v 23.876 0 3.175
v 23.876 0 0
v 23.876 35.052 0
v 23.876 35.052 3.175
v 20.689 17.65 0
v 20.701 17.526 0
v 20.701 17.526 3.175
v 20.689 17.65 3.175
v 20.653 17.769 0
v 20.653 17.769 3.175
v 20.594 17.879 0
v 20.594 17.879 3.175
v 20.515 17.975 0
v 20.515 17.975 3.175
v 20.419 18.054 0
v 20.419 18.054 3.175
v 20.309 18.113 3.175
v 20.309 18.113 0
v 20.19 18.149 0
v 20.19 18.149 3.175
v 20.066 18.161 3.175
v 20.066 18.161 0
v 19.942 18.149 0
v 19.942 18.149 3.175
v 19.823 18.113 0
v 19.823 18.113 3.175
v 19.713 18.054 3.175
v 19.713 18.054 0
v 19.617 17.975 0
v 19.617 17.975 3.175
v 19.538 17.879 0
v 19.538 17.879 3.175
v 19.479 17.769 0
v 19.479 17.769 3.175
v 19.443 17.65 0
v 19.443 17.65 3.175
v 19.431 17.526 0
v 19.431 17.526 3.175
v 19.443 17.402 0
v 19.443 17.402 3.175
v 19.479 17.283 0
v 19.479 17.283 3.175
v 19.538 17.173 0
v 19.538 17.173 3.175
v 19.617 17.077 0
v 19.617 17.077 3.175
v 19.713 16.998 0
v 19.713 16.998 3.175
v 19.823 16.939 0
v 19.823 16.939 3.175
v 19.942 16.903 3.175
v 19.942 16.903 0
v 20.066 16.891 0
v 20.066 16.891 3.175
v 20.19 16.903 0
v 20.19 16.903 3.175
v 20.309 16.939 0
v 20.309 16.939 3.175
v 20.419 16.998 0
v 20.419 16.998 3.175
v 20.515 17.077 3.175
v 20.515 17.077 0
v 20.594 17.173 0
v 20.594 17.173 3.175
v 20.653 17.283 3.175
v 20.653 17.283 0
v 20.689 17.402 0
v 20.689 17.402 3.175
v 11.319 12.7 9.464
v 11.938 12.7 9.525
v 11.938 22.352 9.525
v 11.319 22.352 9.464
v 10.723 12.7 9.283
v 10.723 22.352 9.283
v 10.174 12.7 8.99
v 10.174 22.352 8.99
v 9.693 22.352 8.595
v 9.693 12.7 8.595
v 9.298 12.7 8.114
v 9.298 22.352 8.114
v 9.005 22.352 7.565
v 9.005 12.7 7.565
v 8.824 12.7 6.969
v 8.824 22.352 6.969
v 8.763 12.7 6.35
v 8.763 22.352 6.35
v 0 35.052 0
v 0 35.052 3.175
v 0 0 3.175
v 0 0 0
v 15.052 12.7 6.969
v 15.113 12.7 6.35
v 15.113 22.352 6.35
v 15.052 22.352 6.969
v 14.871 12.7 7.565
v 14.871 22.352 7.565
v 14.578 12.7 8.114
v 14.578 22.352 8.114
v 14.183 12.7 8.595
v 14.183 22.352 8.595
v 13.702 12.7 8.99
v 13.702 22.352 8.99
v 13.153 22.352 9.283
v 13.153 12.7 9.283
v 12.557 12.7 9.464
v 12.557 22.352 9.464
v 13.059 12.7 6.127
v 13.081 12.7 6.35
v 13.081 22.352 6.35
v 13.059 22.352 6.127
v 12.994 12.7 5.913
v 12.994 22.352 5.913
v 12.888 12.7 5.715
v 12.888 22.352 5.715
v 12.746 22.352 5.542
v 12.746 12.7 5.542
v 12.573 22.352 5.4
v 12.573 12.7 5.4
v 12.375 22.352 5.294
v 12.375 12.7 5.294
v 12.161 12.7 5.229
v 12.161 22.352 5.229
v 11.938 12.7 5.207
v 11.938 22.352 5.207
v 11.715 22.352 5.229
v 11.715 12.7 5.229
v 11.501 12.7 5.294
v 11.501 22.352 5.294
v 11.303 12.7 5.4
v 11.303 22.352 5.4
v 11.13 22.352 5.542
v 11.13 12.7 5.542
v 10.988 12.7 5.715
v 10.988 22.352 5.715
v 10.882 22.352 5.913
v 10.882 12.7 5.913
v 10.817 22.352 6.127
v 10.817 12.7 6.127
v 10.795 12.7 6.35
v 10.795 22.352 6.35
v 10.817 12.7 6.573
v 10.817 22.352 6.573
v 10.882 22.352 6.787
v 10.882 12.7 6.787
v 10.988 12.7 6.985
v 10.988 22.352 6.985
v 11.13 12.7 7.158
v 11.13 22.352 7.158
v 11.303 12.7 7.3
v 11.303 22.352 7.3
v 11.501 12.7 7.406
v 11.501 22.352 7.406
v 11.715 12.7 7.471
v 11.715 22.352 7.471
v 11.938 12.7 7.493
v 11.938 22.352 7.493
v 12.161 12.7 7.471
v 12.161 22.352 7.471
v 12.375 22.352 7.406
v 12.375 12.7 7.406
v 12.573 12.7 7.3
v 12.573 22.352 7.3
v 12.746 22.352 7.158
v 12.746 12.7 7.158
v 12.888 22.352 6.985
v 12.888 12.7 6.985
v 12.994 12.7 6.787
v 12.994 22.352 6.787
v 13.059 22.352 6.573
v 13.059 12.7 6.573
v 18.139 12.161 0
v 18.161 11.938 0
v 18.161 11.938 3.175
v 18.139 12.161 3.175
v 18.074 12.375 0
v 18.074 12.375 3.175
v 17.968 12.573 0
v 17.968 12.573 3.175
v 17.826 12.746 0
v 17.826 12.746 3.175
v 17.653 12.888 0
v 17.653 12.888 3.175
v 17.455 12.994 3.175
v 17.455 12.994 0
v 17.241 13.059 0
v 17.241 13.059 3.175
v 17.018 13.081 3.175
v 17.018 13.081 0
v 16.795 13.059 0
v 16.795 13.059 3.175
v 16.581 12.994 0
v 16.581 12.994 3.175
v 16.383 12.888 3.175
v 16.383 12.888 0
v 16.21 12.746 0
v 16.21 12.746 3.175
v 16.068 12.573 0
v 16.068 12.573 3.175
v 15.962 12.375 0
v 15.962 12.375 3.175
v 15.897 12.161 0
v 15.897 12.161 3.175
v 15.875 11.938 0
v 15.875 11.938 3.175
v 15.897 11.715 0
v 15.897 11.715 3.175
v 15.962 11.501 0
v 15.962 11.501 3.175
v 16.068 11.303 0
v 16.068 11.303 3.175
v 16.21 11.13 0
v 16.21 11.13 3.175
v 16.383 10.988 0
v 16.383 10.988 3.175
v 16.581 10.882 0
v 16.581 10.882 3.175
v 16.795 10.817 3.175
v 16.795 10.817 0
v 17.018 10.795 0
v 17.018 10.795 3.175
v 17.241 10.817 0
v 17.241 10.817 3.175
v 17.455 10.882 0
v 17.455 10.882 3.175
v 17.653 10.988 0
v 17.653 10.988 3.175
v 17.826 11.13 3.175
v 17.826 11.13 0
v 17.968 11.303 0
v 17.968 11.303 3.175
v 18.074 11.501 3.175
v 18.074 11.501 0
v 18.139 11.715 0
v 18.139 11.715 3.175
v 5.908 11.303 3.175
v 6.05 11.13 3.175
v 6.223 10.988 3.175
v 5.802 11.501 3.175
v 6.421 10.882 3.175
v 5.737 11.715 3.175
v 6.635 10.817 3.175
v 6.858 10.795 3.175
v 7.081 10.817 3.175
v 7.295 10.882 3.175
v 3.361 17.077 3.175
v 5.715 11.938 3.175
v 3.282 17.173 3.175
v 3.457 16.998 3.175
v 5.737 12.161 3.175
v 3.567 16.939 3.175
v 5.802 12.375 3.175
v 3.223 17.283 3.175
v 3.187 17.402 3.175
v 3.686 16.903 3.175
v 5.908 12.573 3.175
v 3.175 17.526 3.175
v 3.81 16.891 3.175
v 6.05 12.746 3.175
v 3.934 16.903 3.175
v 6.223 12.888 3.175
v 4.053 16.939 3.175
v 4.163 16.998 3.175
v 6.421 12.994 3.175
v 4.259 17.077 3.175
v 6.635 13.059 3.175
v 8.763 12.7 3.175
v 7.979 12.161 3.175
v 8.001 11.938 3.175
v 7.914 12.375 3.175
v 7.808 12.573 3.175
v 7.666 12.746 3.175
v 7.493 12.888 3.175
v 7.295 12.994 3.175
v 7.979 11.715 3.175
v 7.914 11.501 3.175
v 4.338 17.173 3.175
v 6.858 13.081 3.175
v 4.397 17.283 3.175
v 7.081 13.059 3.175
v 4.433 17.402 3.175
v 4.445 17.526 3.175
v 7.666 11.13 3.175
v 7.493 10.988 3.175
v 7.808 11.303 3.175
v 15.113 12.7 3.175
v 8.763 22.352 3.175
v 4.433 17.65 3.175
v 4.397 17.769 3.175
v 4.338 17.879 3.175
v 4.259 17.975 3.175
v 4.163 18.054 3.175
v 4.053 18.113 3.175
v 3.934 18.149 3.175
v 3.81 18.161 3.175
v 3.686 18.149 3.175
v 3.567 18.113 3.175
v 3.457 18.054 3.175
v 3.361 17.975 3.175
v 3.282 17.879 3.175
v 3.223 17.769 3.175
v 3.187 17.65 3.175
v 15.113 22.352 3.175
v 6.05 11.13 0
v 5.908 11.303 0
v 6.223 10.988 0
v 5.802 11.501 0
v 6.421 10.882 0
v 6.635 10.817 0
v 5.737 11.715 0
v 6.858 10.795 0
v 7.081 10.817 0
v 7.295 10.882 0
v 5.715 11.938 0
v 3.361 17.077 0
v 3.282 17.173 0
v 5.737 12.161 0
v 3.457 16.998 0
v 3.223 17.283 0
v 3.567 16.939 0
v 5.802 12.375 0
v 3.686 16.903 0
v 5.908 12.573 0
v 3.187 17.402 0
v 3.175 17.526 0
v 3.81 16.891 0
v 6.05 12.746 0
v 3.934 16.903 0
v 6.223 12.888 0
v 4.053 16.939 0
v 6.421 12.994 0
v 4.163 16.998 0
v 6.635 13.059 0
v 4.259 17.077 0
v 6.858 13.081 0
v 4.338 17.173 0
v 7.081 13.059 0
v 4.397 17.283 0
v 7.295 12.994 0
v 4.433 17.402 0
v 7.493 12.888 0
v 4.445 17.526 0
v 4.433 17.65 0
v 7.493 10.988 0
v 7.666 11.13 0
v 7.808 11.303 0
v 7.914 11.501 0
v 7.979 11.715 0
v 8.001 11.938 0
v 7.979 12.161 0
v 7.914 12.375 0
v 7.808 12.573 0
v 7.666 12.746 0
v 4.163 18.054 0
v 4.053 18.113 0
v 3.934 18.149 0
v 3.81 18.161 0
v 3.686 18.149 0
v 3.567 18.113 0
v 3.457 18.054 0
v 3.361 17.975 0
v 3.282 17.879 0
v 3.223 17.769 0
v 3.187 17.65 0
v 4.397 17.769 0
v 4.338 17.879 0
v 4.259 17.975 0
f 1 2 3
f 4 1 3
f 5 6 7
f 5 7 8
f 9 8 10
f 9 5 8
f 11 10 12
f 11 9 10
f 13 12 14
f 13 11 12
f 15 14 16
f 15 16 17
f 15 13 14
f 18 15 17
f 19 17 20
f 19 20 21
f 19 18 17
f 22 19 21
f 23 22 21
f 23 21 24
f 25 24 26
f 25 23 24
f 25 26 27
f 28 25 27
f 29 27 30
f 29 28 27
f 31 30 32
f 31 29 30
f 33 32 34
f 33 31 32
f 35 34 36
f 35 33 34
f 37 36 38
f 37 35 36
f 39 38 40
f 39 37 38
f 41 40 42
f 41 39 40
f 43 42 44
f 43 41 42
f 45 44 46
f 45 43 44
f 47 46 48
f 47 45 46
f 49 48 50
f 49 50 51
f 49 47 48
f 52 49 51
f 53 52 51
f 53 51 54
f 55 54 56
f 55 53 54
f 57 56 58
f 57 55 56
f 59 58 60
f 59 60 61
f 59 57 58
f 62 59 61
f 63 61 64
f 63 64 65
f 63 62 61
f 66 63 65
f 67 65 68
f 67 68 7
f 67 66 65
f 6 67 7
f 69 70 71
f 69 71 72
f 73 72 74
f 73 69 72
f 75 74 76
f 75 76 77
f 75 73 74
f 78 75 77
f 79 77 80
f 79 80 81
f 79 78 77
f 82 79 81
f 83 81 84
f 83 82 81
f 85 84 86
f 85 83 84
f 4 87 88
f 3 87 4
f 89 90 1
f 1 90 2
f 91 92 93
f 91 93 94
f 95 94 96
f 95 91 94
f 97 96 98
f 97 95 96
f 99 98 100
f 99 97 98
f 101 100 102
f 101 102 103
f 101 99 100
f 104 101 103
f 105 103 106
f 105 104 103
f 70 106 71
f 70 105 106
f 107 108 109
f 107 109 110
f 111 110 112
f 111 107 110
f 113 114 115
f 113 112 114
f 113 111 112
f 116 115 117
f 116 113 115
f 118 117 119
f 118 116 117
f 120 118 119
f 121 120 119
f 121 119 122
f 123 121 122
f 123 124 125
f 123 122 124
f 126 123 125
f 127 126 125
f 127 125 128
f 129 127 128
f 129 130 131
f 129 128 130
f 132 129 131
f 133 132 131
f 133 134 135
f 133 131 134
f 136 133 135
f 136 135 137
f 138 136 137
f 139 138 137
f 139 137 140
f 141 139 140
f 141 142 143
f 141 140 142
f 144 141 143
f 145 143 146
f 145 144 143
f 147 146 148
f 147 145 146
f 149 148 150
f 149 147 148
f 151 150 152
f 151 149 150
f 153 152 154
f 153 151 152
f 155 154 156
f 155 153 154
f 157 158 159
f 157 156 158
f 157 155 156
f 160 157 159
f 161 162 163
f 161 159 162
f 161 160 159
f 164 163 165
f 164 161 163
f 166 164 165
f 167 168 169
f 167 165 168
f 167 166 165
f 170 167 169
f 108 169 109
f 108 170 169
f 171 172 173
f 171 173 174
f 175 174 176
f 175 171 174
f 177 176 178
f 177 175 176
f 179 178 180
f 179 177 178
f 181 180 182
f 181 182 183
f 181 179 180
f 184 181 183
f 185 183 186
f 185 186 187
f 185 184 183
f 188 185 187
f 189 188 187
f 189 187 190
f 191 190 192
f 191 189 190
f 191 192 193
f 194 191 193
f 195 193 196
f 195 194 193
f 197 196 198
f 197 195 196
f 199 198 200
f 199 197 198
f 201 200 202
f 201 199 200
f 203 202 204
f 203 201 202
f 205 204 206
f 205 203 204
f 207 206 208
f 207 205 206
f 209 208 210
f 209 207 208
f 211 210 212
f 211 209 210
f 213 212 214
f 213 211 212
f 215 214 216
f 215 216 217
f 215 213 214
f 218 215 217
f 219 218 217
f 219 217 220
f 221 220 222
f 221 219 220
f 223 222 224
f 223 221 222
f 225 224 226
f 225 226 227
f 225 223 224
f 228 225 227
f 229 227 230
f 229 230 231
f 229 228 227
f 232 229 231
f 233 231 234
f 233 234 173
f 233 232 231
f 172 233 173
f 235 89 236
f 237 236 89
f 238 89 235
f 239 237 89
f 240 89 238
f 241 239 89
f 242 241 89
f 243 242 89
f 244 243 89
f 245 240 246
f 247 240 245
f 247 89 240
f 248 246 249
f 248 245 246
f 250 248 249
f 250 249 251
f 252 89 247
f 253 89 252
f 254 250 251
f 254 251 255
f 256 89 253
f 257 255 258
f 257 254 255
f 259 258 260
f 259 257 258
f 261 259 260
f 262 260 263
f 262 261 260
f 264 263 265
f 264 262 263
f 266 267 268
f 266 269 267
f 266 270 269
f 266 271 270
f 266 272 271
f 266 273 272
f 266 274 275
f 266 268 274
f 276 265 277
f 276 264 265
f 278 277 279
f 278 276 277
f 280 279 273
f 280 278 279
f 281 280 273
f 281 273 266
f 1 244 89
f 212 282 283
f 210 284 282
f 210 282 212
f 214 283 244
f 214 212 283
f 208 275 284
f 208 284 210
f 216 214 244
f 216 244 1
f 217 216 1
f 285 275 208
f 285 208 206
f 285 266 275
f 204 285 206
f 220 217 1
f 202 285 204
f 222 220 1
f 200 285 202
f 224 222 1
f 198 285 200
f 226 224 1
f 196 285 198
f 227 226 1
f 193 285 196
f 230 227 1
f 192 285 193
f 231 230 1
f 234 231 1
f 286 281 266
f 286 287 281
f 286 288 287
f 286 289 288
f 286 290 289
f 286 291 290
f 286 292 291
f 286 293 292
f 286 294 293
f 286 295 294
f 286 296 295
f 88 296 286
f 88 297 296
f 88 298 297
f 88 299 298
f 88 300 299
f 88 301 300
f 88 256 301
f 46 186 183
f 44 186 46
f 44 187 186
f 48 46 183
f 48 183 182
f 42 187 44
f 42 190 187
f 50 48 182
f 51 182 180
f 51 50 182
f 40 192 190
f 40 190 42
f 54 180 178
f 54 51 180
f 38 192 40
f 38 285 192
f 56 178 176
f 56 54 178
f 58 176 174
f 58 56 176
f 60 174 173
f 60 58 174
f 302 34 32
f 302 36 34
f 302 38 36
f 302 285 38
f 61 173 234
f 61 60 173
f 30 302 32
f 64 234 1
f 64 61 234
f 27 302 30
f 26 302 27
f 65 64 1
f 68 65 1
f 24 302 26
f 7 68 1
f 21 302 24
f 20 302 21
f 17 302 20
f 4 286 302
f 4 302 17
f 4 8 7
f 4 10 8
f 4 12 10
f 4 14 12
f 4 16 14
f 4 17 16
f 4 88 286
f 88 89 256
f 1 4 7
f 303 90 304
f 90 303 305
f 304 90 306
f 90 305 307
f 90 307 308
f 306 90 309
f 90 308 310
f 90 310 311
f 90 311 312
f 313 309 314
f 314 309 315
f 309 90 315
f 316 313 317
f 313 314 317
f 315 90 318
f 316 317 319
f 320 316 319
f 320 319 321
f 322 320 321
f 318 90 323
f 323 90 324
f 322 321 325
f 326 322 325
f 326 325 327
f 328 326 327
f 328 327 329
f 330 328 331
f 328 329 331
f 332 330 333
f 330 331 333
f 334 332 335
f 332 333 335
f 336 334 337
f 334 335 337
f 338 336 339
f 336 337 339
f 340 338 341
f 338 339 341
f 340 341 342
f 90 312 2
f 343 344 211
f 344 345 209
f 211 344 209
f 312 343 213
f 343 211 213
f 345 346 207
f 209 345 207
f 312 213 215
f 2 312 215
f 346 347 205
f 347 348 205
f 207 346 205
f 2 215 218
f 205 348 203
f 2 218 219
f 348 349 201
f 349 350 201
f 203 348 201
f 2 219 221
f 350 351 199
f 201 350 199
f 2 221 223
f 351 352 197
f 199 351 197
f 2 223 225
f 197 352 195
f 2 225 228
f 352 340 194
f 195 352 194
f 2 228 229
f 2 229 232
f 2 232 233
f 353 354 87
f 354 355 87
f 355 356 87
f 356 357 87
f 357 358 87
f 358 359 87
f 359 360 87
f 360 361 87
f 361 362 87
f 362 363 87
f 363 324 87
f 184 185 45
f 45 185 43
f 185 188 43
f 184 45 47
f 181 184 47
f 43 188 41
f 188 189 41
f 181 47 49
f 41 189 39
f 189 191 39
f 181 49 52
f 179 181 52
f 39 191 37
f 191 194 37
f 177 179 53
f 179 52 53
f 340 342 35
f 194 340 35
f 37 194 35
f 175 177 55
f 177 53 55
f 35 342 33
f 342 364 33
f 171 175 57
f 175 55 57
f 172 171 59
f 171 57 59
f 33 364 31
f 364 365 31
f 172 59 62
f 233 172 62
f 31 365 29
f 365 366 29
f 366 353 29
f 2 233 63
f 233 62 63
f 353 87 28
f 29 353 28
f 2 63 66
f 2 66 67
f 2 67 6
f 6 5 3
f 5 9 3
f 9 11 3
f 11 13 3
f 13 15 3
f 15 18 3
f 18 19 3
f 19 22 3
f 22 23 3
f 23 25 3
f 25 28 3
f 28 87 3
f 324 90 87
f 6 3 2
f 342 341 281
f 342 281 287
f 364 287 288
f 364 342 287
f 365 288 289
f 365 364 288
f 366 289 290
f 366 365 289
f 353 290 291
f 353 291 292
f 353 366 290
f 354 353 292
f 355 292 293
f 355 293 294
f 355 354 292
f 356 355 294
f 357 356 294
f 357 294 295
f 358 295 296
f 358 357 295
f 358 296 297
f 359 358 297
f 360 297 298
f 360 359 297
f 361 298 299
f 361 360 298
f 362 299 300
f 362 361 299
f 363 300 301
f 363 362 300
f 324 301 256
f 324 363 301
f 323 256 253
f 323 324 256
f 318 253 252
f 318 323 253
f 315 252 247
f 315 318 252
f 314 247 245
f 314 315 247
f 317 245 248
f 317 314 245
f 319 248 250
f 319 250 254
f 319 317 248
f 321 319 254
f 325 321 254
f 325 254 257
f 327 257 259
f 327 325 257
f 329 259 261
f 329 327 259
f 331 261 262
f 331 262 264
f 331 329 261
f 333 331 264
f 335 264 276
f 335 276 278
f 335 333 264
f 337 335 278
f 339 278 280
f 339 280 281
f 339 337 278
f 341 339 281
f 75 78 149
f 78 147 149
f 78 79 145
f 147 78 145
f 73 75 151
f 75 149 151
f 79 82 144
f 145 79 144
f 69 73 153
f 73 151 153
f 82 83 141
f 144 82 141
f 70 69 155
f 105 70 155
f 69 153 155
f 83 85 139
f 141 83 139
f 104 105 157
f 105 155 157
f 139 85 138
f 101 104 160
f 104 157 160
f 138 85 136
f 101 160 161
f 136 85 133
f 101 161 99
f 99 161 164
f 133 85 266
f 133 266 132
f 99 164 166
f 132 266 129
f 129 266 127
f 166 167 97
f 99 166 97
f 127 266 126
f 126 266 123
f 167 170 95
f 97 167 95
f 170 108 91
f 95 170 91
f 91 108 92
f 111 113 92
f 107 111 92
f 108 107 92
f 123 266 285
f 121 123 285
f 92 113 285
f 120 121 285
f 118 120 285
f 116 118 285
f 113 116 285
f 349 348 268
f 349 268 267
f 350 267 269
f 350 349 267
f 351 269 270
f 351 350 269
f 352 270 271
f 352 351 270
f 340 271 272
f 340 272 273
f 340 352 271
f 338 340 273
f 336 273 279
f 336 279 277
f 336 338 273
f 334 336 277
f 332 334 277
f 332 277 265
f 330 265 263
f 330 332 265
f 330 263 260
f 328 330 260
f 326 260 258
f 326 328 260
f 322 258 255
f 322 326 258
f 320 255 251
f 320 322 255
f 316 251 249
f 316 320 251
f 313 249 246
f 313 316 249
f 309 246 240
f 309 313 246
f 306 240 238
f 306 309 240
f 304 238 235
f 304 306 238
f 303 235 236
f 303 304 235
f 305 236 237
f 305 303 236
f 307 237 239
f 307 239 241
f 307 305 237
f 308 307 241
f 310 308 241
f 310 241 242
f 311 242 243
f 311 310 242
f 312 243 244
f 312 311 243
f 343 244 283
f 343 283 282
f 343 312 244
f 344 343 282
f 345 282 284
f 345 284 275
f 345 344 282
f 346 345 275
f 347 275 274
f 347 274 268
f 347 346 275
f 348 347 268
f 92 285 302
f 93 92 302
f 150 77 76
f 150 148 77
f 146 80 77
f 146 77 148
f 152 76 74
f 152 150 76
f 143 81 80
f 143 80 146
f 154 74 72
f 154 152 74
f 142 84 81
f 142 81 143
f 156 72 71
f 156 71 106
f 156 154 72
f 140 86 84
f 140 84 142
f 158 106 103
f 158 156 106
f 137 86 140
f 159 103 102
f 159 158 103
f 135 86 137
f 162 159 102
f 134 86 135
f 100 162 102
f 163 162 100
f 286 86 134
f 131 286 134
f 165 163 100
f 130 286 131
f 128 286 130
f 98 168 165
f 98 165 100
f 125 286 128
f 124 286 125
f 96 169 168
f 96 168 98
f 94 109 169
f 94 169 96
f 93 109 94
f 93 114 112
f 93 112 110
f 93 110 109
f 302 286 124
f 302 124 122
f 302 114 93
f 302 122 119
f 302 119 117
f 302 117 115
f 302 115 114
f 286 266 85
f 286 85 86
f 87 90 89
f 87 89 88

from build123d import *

# Parameters (mm, degrees)
SKETCH1_W               = 23.876
SKETCH1_H               = 35.052
SKETCH1_R               = 1.143
SKETCH1_R_2             = 0.635
BOSS_EXTRUDE1_DEPTH     = 3.175
SKETCH2_W               = 6.35
SKETCH2_H               = 9.652
BOSS_EXTRUDE2_DEPTH     = 9.525
SKETCH3_R               = 1.143
CUT_EXTRUDE2_DEPTH      = 36.052
CUT_EXTRUDE2_DEPTH_BACK = 6.35


with BuildPart() as part:
    # Sketch1 → Boss-Extrude1 (new body)
    with BuildSketch(Plane.XY):
        with Locations((11.938, 17.526)):
            Rectangle(SKETCH1_W, SKETCH1_H)
        with Locations((6.858, 11.938)):
            Circle(SKETCH1_R, mode=Mode.SUBTRACT)
        with Locations((17.018, 11.938)):
            Circle(SKETCH1_R, mode=Mode.SUBTRACT)
        with Locations((20.066, 17.526)):
            Circle(SKETCH1_R_2, mode=Mode.SUBTRACT)
        with Locations((3.81, 17.526)):
            Circle(SKETCH1_R_2, mode=Mode.SUBTRACT)
    extrude(amount=BOSS_EXTRUDE1_DEPTH)

    # Sketch2 → Boss-Extrude2 (add)
    with BuildSketch(Plane.XY):
        with Locations((11.938, 17.526)):
            Rectangle(SKETCH2_W, SKETCH2_H)
    extrude(amount=BOSS_EXTRUDE2_DEPTH)

    # Sketch3 → Cut-Extrude2 (cut, two sides)
    with BuildSketch(Plane(origin=(0, 0, 0), x_dir=(1, 0, 0), z_dir=(0, 1, 0))) as cut_extrude2_sk:
        with Locations((11.938, -6.35)):
            Circle(SKETCH3_R)
        with BuildLine():
            ThreePointArc((11.938, -9.525), (9.69293597, -8.59506403), (8.763, -6.35))
            Line((8.763, -6.35), (8.763, -9.525))
            Line((8.763, -9.525), (11.938, -9.525))
        make_face()
        with BuildLine():
            ThreePointArc((15.113, -6.35), (14.18306403, -8.59506403), (11.938, -9.525))
            Line((11.938, -9.525), (15.113, -9.525))
            Line((15.113, -9.525), (15.113, -6.35))
        make_face()
    extrude(amount=CUT_EXTRUDE2_DEPTH, mode=Mode.SUBTRACT)
    extrude(cut_extrude2_sk.sketch, amount=-CUT_EXTRUDE2_DEPTH_BACK, mode=Mode.SUBTRACT)


solid = part.part
